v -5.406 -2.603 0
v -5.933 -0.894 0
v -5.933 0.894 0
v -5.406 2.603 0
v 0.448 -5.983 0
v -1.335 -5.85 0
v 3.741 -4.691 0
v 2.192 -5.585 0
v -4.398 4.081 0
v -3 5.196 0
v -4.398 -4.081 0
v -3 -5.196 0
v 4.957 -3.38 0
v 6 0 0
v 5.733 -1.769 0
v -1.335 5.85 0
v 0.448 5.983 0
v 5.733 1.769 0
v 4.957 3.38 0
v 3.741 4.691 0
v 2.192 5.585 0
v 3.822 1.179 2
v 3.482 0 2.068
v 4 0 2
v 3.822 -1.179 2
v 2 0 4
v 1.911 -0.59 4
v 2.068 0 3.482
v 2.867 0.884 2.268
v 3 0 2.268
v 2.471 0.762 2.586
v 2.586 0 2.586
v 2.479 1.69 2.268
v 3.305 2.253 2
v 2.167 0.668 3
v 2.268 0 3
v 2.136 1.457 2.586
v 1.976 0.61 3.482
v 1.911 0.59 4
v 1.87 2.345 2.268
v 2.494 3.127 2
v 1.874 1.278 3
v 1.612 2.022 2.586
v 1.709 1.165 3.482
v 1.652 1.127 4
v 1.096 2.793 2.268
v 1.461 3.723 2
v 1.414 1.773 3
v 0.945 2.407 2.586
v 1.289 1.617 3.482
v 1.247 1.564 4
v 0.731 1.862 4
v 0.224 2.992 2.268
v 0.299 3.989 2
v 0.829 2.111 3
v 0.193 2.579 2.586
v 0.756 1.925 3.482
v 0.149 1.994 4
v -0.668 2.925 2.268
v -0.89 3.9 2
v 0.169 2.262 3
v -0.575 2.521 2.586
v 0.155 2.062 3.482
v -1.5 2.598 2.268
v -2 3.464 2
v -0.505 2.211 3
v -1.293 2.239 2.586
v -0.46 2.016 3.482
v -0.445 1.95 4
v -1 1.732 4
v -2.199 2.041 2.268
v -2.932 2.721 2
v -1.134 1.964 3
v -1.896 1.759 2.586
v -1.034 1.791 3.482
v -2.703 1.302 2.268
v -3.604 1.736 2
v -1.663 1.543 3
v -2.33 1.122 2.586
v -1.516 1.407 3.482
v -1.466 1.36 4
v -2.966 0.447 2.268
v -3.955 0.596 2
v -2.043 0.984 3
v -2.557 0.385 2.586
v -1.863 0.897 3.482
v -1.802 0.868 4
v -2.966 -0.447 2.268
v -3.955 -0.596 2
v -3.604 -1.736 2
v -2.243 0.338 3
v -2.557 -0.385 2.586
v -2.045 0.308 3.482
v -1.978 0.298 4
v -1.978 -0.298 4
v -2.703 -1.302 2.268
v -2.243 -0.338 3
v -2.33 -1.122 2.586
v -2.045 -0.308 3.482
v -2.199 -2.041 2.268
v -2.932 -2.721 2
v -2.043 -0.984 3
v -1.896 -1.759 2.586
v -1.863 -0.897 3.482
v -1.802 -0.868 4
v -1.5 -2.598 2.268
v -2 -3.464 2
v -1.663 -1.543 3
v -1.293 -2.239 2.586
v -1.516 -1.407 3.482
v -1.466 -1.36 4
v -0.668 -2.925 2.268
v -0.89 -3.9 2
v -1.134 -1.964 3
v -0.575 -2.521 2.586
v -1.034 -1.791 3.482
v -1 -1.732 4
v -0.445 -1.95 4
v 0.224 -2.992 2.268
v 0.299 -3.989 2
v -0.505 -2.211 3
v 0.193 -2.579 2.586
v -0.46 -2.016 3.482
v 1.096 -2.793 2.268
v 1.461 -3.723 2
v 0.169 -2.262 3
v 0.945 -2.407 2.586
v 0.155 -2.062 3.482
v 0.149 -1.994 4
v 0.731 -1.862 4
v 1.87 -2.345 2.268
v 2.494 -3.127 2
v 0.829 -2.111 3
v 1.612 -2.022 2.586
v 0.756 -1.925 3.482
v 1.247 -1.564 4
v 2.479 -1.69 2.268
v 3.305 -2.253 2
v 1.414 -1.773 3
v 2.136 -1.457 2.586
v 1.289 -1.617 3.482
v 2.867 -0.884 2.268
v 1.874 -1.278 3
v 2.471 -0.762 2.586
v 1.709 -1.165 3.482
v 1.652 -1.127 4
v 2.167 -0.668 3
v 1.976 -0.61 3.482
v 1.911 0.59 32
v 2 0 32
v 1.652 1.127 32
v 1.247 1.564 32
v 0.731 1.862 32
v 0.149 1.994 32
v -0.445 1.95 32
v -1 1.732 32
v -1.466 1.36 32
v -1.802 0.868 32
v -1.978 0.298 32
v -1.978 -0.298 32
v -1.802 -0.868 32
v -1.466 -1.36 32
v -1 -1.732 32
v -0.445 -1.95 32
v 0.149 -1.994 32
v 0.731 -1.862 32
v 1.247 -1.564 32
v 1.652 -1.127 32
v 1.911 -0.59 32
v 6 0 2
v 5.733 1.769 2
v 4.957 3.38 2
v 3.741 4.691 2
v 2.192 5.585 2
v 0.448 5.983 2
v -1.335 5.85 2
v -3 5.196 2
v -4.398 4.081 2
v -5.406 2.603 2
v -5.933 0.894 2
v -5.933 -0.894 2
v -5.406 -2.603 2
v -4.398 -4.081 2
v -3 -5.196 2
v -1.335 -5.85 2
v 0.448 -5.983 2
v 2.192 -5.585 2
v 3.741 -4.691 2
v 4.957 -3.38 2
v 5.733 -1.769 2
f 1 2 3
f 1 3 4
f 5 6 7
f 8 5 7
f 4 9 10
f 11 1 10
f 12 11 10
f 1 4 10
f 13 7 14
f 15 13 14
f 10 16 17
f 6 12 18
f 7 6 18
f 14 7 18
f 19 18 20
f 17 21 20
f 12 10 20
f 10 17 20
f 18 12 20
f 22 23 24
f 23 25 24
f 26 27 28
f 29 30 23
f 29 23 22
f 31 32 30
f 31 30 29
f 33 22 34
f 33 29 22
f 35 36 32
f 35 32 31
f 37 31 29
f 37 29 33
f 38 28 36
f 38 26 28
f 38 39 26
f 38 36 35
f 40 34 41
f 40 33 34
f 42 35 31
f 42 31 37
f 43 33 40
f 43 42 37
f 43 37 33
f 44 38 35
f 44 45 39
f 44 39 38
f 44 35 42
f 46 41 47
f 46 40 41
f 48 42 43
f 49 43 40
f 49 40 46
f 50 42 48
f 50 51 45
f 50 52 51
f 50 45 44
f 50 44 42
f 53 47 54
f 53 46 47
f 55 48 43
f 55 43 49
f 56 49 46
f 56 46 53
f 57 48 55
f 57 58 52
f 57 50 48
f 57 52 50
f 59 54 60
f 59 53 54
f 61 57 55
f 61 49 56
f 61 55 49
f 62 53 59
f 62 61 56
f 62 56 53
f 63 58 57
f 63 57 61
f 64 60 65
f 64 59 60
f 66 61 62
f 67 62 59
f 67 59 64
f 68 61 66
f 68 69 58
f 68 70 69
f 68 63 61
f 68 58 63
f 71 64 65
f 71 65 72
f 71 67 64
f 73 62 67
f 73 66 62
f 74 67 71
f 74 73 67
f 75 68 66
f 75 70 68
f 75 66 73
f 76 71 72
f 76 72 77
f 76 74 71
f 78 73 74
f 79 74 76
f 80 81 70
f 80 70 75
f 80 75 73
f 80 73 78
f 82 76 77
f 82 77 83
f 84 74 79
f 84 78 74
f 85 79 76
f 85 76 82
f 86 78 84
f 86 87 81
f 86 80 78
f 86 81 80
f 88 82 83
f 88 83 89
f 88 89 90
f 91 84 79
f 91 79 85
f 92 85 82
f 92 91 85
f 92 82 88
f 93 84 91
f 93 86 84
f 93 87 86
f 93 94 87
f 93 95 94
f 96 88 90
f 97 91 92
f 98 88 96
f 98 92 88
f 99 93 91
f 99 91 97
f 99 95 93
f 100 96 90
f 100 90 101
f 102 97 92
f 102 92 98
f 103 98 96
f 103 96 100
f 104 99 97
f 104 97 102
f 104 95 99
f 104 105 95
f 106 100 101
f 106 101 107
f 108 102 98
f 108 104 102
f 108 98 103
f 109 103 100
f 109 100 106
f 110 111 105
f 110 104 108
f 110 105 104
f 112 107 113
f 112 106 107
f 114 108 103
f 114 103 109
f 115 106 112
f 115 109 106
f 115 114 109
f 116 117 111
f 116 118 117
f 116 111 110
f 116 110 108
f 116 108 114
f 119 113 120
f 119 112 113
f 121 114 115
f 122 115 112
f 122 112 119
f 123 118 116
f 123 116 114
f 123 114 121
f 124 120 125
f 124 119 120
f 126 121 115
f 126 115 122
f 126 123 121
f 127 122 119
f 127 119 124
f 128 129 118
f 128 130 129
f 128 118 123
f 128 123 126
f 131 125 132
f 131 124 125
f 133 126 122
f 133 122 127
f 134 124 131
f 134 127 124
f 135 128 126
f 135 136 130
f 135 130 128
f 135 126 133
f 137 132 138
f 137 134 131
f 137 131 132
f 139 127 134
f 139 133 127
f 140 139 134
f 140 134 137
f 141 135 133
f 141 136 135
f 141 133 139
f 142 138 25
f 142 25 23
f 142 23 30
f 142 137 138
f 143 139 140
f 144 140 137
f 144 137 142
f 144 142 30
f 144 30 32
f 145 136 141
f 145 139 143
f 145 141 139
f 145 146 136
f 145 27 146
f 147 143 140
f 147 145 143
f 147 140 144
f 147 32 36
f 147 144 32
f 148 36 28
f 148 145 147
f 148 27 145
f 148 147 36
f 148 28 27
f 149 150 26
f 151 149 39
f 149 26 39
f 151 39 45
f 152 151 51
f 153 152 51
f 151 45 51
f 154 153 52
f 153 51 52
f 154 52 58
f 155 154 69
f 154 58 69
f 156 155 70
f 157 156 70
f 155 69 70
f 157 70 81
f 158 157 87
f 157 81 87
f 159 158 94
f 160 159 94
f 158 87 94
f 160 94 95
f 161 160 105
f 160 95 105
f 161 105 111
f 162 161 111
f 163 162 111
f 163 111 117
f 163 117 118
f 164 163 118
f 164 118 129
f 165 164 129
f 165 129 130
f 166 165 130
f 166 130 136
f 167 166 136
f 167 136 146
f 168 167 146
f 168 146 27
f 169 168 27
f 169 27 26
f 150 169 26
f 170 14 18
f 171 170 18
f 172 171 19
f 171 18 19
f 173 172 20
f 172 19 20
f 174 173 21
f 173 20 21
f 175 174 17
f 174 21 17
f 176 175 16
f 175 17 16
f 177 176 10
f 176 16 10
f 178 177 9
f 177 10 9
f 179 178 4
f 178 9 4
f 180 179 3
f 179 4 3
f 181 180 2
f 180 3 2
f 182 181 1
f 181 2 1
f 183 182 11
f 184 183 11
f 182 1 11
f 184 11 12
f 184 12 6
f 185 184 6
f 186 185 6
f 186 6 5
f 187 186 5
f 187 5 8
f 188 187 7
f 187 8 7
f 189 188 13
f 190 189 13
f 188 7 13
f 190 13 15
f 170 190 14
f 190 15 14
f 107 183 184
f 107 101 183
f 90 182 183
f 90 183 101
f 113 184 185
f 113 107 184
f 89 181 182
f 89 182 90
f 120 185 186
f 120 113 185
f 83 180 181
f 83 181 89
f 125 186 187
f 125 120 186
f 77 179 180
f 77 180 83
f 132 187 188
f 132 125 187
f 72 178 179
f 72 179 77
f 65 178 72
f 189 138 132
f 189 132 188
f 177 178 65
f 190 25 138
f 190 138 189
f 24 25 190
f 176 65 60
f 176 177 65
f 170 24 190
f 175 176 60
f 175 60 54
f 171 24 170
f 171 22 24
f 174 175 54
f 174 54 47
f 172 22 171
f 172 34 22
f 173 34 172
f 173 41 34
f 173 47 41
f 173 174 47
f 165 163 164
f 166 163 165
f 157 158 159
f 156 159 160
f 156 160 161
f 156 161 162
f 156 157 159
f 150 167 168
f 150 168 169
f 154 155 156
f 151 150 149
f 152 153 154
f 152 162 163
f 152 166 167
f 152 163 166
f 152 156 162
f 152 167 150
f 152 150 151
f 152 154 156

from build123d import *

# Parameters (mm, degrees)
SKETCH1_R           = 6
BOSS_EXTRUDE1_DEPTH = 2
SKETCH2_R           = 2
BOSS_EXTRUDE2_DEPTH = 35
FILLET1_R           = 2
CUT_EXTRUDE1_START  = -5
SKETCH4_R           = 2
CUT_EXTRUDE1_DEPTH  = 5


with BuildPart() as part:
    # Sketch1 → Boss-Extrude1 (new body)
    with BuildSketch(Plane.XY):
        Circle(SKETCH1_R)
    extrude(amount=BOSS_EXTRUDE1_DEPTH)

    # Sketch2 → Boss-Extrude2 (add)
    with BuildSketch(Plane.XY.offset(2)):
        Circle(SKETCH2_R)
    extrude(amount=BOSS_EXTRUDE2_DEPTH)

    # Fillet1
    fillet1_edges = [part.edges().sort_by_distance(p)[0] for p in [
        (-2, 0, 2),
    ]]
    fillet(fillet1_edges, radius=FILLET1_R)

    # Sketch4 → Cut-Extrude1 (cut)
    with BuildSketch(Plane.XY.offset(37).offset(CUT_EXTRUDE1_START)):
        Circle(SKETCH4_R)
    extrude(amount=CUT_EXTRUDE1_DEPTH, mode=Mode.SUBTRACT)


solid = part.part
